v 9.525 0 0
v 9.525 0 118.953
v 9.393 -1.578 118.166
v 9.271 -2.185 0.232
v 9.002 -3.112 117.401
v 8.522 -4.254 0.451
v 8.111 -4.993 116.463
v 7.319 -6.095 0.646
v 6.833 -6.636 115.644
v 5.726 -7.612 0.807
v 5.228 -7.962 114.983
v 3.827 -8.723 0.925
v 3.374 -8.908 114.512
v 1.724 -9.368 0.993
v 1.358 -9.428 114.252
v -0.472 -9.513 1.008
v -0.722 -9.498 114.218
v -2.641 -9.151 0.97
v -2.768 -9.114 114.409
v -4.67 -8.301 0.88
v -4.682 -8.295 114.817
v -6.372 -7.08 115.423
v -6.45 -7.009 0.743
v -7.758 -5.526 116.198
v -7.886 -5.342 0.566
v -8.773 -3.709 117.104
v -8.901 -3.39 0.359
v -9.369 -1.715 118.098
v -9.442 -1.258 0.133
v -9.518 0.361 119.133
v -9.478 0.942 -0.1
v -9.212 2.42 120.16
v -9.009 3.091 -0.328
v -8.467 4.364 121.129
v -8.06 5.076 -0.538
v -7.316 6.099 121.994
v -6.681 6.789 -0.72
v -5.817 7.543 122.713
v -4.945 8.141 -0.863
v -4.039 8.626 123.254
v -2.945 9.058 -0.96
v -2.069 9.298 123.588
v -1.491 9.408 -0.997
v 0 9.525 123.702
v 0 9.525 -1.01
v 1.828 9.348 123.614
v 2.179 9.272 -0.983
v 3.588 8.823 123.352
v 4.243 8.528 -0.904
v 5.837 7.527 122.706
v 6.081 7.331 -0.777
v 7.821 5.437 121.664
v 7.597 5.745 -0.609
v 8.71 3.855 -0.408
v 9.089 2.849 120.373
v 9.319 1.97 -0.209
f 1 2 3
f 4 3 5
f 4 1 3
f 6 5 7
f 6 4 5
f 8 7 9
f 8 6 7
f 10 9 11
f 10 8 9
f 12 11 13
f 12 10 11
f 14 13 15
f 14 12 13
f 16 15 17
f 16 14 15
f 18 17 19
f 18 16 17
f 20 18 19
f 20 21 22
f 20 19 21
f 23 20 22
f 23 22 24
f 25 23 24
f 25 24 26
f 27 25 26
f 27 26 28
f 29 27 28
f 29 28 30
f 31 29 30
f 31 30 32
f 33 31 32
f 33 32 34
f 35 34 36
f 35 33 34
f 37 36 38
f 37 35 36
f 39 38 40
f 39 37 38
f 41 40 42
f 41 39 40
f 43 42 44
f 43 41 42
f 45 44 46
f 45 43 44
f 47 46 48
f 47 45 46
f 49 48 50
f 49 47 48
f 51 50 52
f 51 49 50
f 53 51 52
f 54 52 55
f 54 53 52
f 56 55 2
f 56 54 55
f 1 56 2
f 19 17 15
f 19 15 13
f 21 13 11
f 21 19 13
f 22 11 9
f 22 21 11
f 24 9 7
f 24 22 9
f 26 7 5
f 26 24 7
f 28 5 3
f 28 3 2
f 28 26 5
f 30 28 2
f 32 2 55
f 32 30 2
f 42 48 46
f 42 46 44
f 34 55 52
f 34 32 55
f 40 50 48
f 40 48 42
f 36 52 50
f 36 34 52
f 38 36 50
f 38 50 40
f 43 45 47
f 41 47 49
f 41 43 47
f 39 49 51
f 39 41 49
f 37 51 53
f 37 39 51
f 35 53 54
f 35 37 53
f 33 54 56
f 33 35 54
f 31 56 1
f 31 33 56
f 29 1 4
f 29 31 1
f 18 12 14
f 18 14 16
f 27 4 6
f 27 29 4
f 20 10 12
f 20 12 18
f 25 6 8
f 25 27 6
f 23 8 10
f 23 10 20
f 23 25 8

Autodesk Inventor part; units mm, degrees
ref_plane "Start Plane" through (0, 0, -1.0095) normal (0, 0, 1) x (1, 0, 0)
ref_plane "End Plane" through (0, 0, 123.7019) normal (0, 0, 1) x (1, 0, 0)
sketch "Sketch" plane through (0, 0, 0) normal (0, 0, 1) x (1, 0, 0)
  circle A0 centre (0, 0) radius 9.525
  dimension "d0" = 19.05
extrude "Body" add sketch "Sketch" along normal up to surface (124.7114 mm away) from surface at -1.0095
sketch "Sketch2" plane through (0, 0, 0) normal (0, 0, 1) x (1, 0, 0)
  line L0 (0, 0) -> (10, 0)
ref_plane "Work Plane3" through (0, 0, 0) normal (0, -1, 0) x (1, 0, 0)
ref_plane "Work Plane4" through (0, 9.525, 123.7019) normal (0, -0.4462, 0.8949) x (1, 0, 0)
split "Split1" plane through (0, 9.525, 123.7019) removes the side toward (0, -0.4462, 0.8949)
ref_plane "Work Plane5" through (0, 9.525, -1.0095) normal (0, -0.1054, -0.9944) x (1, 0, 0)
split "Split2" plane through (0, 9.525, -1.0095) removes the side toward (0, -0.1054, -0.9944)
sketch "Sketch3" plane through (0, 0, 0) normal (0, -1, 0) x (1, 0, 0)
  line L0 (-2, -1.0095) -> (12, -1.0095) projected
  line L1 (-2, 123.7019) -> (12, 123.7019) projected
  dimension "d7" = 124.7114
equation "\"d0\" = Diam"
equation "\"d1\" = G_L"
equation "\"Diam\" = 19.05"
equation "\"G_L\" = d7"
equation "\"G_OFFSET_START\" = 1.00953"
equation "\"G_OFFSET_END\" = 4.74899"
equation "\"d4\" = -G_OFFSET_START"
equation "\"d5\" = G_OFFSET_END + B_L"
equation "\"B_L\" = 118.95289"
properties part number "ANSI/AISC Rolled Steel - 3/4-4.91, RB" material "Steel, Mild"
